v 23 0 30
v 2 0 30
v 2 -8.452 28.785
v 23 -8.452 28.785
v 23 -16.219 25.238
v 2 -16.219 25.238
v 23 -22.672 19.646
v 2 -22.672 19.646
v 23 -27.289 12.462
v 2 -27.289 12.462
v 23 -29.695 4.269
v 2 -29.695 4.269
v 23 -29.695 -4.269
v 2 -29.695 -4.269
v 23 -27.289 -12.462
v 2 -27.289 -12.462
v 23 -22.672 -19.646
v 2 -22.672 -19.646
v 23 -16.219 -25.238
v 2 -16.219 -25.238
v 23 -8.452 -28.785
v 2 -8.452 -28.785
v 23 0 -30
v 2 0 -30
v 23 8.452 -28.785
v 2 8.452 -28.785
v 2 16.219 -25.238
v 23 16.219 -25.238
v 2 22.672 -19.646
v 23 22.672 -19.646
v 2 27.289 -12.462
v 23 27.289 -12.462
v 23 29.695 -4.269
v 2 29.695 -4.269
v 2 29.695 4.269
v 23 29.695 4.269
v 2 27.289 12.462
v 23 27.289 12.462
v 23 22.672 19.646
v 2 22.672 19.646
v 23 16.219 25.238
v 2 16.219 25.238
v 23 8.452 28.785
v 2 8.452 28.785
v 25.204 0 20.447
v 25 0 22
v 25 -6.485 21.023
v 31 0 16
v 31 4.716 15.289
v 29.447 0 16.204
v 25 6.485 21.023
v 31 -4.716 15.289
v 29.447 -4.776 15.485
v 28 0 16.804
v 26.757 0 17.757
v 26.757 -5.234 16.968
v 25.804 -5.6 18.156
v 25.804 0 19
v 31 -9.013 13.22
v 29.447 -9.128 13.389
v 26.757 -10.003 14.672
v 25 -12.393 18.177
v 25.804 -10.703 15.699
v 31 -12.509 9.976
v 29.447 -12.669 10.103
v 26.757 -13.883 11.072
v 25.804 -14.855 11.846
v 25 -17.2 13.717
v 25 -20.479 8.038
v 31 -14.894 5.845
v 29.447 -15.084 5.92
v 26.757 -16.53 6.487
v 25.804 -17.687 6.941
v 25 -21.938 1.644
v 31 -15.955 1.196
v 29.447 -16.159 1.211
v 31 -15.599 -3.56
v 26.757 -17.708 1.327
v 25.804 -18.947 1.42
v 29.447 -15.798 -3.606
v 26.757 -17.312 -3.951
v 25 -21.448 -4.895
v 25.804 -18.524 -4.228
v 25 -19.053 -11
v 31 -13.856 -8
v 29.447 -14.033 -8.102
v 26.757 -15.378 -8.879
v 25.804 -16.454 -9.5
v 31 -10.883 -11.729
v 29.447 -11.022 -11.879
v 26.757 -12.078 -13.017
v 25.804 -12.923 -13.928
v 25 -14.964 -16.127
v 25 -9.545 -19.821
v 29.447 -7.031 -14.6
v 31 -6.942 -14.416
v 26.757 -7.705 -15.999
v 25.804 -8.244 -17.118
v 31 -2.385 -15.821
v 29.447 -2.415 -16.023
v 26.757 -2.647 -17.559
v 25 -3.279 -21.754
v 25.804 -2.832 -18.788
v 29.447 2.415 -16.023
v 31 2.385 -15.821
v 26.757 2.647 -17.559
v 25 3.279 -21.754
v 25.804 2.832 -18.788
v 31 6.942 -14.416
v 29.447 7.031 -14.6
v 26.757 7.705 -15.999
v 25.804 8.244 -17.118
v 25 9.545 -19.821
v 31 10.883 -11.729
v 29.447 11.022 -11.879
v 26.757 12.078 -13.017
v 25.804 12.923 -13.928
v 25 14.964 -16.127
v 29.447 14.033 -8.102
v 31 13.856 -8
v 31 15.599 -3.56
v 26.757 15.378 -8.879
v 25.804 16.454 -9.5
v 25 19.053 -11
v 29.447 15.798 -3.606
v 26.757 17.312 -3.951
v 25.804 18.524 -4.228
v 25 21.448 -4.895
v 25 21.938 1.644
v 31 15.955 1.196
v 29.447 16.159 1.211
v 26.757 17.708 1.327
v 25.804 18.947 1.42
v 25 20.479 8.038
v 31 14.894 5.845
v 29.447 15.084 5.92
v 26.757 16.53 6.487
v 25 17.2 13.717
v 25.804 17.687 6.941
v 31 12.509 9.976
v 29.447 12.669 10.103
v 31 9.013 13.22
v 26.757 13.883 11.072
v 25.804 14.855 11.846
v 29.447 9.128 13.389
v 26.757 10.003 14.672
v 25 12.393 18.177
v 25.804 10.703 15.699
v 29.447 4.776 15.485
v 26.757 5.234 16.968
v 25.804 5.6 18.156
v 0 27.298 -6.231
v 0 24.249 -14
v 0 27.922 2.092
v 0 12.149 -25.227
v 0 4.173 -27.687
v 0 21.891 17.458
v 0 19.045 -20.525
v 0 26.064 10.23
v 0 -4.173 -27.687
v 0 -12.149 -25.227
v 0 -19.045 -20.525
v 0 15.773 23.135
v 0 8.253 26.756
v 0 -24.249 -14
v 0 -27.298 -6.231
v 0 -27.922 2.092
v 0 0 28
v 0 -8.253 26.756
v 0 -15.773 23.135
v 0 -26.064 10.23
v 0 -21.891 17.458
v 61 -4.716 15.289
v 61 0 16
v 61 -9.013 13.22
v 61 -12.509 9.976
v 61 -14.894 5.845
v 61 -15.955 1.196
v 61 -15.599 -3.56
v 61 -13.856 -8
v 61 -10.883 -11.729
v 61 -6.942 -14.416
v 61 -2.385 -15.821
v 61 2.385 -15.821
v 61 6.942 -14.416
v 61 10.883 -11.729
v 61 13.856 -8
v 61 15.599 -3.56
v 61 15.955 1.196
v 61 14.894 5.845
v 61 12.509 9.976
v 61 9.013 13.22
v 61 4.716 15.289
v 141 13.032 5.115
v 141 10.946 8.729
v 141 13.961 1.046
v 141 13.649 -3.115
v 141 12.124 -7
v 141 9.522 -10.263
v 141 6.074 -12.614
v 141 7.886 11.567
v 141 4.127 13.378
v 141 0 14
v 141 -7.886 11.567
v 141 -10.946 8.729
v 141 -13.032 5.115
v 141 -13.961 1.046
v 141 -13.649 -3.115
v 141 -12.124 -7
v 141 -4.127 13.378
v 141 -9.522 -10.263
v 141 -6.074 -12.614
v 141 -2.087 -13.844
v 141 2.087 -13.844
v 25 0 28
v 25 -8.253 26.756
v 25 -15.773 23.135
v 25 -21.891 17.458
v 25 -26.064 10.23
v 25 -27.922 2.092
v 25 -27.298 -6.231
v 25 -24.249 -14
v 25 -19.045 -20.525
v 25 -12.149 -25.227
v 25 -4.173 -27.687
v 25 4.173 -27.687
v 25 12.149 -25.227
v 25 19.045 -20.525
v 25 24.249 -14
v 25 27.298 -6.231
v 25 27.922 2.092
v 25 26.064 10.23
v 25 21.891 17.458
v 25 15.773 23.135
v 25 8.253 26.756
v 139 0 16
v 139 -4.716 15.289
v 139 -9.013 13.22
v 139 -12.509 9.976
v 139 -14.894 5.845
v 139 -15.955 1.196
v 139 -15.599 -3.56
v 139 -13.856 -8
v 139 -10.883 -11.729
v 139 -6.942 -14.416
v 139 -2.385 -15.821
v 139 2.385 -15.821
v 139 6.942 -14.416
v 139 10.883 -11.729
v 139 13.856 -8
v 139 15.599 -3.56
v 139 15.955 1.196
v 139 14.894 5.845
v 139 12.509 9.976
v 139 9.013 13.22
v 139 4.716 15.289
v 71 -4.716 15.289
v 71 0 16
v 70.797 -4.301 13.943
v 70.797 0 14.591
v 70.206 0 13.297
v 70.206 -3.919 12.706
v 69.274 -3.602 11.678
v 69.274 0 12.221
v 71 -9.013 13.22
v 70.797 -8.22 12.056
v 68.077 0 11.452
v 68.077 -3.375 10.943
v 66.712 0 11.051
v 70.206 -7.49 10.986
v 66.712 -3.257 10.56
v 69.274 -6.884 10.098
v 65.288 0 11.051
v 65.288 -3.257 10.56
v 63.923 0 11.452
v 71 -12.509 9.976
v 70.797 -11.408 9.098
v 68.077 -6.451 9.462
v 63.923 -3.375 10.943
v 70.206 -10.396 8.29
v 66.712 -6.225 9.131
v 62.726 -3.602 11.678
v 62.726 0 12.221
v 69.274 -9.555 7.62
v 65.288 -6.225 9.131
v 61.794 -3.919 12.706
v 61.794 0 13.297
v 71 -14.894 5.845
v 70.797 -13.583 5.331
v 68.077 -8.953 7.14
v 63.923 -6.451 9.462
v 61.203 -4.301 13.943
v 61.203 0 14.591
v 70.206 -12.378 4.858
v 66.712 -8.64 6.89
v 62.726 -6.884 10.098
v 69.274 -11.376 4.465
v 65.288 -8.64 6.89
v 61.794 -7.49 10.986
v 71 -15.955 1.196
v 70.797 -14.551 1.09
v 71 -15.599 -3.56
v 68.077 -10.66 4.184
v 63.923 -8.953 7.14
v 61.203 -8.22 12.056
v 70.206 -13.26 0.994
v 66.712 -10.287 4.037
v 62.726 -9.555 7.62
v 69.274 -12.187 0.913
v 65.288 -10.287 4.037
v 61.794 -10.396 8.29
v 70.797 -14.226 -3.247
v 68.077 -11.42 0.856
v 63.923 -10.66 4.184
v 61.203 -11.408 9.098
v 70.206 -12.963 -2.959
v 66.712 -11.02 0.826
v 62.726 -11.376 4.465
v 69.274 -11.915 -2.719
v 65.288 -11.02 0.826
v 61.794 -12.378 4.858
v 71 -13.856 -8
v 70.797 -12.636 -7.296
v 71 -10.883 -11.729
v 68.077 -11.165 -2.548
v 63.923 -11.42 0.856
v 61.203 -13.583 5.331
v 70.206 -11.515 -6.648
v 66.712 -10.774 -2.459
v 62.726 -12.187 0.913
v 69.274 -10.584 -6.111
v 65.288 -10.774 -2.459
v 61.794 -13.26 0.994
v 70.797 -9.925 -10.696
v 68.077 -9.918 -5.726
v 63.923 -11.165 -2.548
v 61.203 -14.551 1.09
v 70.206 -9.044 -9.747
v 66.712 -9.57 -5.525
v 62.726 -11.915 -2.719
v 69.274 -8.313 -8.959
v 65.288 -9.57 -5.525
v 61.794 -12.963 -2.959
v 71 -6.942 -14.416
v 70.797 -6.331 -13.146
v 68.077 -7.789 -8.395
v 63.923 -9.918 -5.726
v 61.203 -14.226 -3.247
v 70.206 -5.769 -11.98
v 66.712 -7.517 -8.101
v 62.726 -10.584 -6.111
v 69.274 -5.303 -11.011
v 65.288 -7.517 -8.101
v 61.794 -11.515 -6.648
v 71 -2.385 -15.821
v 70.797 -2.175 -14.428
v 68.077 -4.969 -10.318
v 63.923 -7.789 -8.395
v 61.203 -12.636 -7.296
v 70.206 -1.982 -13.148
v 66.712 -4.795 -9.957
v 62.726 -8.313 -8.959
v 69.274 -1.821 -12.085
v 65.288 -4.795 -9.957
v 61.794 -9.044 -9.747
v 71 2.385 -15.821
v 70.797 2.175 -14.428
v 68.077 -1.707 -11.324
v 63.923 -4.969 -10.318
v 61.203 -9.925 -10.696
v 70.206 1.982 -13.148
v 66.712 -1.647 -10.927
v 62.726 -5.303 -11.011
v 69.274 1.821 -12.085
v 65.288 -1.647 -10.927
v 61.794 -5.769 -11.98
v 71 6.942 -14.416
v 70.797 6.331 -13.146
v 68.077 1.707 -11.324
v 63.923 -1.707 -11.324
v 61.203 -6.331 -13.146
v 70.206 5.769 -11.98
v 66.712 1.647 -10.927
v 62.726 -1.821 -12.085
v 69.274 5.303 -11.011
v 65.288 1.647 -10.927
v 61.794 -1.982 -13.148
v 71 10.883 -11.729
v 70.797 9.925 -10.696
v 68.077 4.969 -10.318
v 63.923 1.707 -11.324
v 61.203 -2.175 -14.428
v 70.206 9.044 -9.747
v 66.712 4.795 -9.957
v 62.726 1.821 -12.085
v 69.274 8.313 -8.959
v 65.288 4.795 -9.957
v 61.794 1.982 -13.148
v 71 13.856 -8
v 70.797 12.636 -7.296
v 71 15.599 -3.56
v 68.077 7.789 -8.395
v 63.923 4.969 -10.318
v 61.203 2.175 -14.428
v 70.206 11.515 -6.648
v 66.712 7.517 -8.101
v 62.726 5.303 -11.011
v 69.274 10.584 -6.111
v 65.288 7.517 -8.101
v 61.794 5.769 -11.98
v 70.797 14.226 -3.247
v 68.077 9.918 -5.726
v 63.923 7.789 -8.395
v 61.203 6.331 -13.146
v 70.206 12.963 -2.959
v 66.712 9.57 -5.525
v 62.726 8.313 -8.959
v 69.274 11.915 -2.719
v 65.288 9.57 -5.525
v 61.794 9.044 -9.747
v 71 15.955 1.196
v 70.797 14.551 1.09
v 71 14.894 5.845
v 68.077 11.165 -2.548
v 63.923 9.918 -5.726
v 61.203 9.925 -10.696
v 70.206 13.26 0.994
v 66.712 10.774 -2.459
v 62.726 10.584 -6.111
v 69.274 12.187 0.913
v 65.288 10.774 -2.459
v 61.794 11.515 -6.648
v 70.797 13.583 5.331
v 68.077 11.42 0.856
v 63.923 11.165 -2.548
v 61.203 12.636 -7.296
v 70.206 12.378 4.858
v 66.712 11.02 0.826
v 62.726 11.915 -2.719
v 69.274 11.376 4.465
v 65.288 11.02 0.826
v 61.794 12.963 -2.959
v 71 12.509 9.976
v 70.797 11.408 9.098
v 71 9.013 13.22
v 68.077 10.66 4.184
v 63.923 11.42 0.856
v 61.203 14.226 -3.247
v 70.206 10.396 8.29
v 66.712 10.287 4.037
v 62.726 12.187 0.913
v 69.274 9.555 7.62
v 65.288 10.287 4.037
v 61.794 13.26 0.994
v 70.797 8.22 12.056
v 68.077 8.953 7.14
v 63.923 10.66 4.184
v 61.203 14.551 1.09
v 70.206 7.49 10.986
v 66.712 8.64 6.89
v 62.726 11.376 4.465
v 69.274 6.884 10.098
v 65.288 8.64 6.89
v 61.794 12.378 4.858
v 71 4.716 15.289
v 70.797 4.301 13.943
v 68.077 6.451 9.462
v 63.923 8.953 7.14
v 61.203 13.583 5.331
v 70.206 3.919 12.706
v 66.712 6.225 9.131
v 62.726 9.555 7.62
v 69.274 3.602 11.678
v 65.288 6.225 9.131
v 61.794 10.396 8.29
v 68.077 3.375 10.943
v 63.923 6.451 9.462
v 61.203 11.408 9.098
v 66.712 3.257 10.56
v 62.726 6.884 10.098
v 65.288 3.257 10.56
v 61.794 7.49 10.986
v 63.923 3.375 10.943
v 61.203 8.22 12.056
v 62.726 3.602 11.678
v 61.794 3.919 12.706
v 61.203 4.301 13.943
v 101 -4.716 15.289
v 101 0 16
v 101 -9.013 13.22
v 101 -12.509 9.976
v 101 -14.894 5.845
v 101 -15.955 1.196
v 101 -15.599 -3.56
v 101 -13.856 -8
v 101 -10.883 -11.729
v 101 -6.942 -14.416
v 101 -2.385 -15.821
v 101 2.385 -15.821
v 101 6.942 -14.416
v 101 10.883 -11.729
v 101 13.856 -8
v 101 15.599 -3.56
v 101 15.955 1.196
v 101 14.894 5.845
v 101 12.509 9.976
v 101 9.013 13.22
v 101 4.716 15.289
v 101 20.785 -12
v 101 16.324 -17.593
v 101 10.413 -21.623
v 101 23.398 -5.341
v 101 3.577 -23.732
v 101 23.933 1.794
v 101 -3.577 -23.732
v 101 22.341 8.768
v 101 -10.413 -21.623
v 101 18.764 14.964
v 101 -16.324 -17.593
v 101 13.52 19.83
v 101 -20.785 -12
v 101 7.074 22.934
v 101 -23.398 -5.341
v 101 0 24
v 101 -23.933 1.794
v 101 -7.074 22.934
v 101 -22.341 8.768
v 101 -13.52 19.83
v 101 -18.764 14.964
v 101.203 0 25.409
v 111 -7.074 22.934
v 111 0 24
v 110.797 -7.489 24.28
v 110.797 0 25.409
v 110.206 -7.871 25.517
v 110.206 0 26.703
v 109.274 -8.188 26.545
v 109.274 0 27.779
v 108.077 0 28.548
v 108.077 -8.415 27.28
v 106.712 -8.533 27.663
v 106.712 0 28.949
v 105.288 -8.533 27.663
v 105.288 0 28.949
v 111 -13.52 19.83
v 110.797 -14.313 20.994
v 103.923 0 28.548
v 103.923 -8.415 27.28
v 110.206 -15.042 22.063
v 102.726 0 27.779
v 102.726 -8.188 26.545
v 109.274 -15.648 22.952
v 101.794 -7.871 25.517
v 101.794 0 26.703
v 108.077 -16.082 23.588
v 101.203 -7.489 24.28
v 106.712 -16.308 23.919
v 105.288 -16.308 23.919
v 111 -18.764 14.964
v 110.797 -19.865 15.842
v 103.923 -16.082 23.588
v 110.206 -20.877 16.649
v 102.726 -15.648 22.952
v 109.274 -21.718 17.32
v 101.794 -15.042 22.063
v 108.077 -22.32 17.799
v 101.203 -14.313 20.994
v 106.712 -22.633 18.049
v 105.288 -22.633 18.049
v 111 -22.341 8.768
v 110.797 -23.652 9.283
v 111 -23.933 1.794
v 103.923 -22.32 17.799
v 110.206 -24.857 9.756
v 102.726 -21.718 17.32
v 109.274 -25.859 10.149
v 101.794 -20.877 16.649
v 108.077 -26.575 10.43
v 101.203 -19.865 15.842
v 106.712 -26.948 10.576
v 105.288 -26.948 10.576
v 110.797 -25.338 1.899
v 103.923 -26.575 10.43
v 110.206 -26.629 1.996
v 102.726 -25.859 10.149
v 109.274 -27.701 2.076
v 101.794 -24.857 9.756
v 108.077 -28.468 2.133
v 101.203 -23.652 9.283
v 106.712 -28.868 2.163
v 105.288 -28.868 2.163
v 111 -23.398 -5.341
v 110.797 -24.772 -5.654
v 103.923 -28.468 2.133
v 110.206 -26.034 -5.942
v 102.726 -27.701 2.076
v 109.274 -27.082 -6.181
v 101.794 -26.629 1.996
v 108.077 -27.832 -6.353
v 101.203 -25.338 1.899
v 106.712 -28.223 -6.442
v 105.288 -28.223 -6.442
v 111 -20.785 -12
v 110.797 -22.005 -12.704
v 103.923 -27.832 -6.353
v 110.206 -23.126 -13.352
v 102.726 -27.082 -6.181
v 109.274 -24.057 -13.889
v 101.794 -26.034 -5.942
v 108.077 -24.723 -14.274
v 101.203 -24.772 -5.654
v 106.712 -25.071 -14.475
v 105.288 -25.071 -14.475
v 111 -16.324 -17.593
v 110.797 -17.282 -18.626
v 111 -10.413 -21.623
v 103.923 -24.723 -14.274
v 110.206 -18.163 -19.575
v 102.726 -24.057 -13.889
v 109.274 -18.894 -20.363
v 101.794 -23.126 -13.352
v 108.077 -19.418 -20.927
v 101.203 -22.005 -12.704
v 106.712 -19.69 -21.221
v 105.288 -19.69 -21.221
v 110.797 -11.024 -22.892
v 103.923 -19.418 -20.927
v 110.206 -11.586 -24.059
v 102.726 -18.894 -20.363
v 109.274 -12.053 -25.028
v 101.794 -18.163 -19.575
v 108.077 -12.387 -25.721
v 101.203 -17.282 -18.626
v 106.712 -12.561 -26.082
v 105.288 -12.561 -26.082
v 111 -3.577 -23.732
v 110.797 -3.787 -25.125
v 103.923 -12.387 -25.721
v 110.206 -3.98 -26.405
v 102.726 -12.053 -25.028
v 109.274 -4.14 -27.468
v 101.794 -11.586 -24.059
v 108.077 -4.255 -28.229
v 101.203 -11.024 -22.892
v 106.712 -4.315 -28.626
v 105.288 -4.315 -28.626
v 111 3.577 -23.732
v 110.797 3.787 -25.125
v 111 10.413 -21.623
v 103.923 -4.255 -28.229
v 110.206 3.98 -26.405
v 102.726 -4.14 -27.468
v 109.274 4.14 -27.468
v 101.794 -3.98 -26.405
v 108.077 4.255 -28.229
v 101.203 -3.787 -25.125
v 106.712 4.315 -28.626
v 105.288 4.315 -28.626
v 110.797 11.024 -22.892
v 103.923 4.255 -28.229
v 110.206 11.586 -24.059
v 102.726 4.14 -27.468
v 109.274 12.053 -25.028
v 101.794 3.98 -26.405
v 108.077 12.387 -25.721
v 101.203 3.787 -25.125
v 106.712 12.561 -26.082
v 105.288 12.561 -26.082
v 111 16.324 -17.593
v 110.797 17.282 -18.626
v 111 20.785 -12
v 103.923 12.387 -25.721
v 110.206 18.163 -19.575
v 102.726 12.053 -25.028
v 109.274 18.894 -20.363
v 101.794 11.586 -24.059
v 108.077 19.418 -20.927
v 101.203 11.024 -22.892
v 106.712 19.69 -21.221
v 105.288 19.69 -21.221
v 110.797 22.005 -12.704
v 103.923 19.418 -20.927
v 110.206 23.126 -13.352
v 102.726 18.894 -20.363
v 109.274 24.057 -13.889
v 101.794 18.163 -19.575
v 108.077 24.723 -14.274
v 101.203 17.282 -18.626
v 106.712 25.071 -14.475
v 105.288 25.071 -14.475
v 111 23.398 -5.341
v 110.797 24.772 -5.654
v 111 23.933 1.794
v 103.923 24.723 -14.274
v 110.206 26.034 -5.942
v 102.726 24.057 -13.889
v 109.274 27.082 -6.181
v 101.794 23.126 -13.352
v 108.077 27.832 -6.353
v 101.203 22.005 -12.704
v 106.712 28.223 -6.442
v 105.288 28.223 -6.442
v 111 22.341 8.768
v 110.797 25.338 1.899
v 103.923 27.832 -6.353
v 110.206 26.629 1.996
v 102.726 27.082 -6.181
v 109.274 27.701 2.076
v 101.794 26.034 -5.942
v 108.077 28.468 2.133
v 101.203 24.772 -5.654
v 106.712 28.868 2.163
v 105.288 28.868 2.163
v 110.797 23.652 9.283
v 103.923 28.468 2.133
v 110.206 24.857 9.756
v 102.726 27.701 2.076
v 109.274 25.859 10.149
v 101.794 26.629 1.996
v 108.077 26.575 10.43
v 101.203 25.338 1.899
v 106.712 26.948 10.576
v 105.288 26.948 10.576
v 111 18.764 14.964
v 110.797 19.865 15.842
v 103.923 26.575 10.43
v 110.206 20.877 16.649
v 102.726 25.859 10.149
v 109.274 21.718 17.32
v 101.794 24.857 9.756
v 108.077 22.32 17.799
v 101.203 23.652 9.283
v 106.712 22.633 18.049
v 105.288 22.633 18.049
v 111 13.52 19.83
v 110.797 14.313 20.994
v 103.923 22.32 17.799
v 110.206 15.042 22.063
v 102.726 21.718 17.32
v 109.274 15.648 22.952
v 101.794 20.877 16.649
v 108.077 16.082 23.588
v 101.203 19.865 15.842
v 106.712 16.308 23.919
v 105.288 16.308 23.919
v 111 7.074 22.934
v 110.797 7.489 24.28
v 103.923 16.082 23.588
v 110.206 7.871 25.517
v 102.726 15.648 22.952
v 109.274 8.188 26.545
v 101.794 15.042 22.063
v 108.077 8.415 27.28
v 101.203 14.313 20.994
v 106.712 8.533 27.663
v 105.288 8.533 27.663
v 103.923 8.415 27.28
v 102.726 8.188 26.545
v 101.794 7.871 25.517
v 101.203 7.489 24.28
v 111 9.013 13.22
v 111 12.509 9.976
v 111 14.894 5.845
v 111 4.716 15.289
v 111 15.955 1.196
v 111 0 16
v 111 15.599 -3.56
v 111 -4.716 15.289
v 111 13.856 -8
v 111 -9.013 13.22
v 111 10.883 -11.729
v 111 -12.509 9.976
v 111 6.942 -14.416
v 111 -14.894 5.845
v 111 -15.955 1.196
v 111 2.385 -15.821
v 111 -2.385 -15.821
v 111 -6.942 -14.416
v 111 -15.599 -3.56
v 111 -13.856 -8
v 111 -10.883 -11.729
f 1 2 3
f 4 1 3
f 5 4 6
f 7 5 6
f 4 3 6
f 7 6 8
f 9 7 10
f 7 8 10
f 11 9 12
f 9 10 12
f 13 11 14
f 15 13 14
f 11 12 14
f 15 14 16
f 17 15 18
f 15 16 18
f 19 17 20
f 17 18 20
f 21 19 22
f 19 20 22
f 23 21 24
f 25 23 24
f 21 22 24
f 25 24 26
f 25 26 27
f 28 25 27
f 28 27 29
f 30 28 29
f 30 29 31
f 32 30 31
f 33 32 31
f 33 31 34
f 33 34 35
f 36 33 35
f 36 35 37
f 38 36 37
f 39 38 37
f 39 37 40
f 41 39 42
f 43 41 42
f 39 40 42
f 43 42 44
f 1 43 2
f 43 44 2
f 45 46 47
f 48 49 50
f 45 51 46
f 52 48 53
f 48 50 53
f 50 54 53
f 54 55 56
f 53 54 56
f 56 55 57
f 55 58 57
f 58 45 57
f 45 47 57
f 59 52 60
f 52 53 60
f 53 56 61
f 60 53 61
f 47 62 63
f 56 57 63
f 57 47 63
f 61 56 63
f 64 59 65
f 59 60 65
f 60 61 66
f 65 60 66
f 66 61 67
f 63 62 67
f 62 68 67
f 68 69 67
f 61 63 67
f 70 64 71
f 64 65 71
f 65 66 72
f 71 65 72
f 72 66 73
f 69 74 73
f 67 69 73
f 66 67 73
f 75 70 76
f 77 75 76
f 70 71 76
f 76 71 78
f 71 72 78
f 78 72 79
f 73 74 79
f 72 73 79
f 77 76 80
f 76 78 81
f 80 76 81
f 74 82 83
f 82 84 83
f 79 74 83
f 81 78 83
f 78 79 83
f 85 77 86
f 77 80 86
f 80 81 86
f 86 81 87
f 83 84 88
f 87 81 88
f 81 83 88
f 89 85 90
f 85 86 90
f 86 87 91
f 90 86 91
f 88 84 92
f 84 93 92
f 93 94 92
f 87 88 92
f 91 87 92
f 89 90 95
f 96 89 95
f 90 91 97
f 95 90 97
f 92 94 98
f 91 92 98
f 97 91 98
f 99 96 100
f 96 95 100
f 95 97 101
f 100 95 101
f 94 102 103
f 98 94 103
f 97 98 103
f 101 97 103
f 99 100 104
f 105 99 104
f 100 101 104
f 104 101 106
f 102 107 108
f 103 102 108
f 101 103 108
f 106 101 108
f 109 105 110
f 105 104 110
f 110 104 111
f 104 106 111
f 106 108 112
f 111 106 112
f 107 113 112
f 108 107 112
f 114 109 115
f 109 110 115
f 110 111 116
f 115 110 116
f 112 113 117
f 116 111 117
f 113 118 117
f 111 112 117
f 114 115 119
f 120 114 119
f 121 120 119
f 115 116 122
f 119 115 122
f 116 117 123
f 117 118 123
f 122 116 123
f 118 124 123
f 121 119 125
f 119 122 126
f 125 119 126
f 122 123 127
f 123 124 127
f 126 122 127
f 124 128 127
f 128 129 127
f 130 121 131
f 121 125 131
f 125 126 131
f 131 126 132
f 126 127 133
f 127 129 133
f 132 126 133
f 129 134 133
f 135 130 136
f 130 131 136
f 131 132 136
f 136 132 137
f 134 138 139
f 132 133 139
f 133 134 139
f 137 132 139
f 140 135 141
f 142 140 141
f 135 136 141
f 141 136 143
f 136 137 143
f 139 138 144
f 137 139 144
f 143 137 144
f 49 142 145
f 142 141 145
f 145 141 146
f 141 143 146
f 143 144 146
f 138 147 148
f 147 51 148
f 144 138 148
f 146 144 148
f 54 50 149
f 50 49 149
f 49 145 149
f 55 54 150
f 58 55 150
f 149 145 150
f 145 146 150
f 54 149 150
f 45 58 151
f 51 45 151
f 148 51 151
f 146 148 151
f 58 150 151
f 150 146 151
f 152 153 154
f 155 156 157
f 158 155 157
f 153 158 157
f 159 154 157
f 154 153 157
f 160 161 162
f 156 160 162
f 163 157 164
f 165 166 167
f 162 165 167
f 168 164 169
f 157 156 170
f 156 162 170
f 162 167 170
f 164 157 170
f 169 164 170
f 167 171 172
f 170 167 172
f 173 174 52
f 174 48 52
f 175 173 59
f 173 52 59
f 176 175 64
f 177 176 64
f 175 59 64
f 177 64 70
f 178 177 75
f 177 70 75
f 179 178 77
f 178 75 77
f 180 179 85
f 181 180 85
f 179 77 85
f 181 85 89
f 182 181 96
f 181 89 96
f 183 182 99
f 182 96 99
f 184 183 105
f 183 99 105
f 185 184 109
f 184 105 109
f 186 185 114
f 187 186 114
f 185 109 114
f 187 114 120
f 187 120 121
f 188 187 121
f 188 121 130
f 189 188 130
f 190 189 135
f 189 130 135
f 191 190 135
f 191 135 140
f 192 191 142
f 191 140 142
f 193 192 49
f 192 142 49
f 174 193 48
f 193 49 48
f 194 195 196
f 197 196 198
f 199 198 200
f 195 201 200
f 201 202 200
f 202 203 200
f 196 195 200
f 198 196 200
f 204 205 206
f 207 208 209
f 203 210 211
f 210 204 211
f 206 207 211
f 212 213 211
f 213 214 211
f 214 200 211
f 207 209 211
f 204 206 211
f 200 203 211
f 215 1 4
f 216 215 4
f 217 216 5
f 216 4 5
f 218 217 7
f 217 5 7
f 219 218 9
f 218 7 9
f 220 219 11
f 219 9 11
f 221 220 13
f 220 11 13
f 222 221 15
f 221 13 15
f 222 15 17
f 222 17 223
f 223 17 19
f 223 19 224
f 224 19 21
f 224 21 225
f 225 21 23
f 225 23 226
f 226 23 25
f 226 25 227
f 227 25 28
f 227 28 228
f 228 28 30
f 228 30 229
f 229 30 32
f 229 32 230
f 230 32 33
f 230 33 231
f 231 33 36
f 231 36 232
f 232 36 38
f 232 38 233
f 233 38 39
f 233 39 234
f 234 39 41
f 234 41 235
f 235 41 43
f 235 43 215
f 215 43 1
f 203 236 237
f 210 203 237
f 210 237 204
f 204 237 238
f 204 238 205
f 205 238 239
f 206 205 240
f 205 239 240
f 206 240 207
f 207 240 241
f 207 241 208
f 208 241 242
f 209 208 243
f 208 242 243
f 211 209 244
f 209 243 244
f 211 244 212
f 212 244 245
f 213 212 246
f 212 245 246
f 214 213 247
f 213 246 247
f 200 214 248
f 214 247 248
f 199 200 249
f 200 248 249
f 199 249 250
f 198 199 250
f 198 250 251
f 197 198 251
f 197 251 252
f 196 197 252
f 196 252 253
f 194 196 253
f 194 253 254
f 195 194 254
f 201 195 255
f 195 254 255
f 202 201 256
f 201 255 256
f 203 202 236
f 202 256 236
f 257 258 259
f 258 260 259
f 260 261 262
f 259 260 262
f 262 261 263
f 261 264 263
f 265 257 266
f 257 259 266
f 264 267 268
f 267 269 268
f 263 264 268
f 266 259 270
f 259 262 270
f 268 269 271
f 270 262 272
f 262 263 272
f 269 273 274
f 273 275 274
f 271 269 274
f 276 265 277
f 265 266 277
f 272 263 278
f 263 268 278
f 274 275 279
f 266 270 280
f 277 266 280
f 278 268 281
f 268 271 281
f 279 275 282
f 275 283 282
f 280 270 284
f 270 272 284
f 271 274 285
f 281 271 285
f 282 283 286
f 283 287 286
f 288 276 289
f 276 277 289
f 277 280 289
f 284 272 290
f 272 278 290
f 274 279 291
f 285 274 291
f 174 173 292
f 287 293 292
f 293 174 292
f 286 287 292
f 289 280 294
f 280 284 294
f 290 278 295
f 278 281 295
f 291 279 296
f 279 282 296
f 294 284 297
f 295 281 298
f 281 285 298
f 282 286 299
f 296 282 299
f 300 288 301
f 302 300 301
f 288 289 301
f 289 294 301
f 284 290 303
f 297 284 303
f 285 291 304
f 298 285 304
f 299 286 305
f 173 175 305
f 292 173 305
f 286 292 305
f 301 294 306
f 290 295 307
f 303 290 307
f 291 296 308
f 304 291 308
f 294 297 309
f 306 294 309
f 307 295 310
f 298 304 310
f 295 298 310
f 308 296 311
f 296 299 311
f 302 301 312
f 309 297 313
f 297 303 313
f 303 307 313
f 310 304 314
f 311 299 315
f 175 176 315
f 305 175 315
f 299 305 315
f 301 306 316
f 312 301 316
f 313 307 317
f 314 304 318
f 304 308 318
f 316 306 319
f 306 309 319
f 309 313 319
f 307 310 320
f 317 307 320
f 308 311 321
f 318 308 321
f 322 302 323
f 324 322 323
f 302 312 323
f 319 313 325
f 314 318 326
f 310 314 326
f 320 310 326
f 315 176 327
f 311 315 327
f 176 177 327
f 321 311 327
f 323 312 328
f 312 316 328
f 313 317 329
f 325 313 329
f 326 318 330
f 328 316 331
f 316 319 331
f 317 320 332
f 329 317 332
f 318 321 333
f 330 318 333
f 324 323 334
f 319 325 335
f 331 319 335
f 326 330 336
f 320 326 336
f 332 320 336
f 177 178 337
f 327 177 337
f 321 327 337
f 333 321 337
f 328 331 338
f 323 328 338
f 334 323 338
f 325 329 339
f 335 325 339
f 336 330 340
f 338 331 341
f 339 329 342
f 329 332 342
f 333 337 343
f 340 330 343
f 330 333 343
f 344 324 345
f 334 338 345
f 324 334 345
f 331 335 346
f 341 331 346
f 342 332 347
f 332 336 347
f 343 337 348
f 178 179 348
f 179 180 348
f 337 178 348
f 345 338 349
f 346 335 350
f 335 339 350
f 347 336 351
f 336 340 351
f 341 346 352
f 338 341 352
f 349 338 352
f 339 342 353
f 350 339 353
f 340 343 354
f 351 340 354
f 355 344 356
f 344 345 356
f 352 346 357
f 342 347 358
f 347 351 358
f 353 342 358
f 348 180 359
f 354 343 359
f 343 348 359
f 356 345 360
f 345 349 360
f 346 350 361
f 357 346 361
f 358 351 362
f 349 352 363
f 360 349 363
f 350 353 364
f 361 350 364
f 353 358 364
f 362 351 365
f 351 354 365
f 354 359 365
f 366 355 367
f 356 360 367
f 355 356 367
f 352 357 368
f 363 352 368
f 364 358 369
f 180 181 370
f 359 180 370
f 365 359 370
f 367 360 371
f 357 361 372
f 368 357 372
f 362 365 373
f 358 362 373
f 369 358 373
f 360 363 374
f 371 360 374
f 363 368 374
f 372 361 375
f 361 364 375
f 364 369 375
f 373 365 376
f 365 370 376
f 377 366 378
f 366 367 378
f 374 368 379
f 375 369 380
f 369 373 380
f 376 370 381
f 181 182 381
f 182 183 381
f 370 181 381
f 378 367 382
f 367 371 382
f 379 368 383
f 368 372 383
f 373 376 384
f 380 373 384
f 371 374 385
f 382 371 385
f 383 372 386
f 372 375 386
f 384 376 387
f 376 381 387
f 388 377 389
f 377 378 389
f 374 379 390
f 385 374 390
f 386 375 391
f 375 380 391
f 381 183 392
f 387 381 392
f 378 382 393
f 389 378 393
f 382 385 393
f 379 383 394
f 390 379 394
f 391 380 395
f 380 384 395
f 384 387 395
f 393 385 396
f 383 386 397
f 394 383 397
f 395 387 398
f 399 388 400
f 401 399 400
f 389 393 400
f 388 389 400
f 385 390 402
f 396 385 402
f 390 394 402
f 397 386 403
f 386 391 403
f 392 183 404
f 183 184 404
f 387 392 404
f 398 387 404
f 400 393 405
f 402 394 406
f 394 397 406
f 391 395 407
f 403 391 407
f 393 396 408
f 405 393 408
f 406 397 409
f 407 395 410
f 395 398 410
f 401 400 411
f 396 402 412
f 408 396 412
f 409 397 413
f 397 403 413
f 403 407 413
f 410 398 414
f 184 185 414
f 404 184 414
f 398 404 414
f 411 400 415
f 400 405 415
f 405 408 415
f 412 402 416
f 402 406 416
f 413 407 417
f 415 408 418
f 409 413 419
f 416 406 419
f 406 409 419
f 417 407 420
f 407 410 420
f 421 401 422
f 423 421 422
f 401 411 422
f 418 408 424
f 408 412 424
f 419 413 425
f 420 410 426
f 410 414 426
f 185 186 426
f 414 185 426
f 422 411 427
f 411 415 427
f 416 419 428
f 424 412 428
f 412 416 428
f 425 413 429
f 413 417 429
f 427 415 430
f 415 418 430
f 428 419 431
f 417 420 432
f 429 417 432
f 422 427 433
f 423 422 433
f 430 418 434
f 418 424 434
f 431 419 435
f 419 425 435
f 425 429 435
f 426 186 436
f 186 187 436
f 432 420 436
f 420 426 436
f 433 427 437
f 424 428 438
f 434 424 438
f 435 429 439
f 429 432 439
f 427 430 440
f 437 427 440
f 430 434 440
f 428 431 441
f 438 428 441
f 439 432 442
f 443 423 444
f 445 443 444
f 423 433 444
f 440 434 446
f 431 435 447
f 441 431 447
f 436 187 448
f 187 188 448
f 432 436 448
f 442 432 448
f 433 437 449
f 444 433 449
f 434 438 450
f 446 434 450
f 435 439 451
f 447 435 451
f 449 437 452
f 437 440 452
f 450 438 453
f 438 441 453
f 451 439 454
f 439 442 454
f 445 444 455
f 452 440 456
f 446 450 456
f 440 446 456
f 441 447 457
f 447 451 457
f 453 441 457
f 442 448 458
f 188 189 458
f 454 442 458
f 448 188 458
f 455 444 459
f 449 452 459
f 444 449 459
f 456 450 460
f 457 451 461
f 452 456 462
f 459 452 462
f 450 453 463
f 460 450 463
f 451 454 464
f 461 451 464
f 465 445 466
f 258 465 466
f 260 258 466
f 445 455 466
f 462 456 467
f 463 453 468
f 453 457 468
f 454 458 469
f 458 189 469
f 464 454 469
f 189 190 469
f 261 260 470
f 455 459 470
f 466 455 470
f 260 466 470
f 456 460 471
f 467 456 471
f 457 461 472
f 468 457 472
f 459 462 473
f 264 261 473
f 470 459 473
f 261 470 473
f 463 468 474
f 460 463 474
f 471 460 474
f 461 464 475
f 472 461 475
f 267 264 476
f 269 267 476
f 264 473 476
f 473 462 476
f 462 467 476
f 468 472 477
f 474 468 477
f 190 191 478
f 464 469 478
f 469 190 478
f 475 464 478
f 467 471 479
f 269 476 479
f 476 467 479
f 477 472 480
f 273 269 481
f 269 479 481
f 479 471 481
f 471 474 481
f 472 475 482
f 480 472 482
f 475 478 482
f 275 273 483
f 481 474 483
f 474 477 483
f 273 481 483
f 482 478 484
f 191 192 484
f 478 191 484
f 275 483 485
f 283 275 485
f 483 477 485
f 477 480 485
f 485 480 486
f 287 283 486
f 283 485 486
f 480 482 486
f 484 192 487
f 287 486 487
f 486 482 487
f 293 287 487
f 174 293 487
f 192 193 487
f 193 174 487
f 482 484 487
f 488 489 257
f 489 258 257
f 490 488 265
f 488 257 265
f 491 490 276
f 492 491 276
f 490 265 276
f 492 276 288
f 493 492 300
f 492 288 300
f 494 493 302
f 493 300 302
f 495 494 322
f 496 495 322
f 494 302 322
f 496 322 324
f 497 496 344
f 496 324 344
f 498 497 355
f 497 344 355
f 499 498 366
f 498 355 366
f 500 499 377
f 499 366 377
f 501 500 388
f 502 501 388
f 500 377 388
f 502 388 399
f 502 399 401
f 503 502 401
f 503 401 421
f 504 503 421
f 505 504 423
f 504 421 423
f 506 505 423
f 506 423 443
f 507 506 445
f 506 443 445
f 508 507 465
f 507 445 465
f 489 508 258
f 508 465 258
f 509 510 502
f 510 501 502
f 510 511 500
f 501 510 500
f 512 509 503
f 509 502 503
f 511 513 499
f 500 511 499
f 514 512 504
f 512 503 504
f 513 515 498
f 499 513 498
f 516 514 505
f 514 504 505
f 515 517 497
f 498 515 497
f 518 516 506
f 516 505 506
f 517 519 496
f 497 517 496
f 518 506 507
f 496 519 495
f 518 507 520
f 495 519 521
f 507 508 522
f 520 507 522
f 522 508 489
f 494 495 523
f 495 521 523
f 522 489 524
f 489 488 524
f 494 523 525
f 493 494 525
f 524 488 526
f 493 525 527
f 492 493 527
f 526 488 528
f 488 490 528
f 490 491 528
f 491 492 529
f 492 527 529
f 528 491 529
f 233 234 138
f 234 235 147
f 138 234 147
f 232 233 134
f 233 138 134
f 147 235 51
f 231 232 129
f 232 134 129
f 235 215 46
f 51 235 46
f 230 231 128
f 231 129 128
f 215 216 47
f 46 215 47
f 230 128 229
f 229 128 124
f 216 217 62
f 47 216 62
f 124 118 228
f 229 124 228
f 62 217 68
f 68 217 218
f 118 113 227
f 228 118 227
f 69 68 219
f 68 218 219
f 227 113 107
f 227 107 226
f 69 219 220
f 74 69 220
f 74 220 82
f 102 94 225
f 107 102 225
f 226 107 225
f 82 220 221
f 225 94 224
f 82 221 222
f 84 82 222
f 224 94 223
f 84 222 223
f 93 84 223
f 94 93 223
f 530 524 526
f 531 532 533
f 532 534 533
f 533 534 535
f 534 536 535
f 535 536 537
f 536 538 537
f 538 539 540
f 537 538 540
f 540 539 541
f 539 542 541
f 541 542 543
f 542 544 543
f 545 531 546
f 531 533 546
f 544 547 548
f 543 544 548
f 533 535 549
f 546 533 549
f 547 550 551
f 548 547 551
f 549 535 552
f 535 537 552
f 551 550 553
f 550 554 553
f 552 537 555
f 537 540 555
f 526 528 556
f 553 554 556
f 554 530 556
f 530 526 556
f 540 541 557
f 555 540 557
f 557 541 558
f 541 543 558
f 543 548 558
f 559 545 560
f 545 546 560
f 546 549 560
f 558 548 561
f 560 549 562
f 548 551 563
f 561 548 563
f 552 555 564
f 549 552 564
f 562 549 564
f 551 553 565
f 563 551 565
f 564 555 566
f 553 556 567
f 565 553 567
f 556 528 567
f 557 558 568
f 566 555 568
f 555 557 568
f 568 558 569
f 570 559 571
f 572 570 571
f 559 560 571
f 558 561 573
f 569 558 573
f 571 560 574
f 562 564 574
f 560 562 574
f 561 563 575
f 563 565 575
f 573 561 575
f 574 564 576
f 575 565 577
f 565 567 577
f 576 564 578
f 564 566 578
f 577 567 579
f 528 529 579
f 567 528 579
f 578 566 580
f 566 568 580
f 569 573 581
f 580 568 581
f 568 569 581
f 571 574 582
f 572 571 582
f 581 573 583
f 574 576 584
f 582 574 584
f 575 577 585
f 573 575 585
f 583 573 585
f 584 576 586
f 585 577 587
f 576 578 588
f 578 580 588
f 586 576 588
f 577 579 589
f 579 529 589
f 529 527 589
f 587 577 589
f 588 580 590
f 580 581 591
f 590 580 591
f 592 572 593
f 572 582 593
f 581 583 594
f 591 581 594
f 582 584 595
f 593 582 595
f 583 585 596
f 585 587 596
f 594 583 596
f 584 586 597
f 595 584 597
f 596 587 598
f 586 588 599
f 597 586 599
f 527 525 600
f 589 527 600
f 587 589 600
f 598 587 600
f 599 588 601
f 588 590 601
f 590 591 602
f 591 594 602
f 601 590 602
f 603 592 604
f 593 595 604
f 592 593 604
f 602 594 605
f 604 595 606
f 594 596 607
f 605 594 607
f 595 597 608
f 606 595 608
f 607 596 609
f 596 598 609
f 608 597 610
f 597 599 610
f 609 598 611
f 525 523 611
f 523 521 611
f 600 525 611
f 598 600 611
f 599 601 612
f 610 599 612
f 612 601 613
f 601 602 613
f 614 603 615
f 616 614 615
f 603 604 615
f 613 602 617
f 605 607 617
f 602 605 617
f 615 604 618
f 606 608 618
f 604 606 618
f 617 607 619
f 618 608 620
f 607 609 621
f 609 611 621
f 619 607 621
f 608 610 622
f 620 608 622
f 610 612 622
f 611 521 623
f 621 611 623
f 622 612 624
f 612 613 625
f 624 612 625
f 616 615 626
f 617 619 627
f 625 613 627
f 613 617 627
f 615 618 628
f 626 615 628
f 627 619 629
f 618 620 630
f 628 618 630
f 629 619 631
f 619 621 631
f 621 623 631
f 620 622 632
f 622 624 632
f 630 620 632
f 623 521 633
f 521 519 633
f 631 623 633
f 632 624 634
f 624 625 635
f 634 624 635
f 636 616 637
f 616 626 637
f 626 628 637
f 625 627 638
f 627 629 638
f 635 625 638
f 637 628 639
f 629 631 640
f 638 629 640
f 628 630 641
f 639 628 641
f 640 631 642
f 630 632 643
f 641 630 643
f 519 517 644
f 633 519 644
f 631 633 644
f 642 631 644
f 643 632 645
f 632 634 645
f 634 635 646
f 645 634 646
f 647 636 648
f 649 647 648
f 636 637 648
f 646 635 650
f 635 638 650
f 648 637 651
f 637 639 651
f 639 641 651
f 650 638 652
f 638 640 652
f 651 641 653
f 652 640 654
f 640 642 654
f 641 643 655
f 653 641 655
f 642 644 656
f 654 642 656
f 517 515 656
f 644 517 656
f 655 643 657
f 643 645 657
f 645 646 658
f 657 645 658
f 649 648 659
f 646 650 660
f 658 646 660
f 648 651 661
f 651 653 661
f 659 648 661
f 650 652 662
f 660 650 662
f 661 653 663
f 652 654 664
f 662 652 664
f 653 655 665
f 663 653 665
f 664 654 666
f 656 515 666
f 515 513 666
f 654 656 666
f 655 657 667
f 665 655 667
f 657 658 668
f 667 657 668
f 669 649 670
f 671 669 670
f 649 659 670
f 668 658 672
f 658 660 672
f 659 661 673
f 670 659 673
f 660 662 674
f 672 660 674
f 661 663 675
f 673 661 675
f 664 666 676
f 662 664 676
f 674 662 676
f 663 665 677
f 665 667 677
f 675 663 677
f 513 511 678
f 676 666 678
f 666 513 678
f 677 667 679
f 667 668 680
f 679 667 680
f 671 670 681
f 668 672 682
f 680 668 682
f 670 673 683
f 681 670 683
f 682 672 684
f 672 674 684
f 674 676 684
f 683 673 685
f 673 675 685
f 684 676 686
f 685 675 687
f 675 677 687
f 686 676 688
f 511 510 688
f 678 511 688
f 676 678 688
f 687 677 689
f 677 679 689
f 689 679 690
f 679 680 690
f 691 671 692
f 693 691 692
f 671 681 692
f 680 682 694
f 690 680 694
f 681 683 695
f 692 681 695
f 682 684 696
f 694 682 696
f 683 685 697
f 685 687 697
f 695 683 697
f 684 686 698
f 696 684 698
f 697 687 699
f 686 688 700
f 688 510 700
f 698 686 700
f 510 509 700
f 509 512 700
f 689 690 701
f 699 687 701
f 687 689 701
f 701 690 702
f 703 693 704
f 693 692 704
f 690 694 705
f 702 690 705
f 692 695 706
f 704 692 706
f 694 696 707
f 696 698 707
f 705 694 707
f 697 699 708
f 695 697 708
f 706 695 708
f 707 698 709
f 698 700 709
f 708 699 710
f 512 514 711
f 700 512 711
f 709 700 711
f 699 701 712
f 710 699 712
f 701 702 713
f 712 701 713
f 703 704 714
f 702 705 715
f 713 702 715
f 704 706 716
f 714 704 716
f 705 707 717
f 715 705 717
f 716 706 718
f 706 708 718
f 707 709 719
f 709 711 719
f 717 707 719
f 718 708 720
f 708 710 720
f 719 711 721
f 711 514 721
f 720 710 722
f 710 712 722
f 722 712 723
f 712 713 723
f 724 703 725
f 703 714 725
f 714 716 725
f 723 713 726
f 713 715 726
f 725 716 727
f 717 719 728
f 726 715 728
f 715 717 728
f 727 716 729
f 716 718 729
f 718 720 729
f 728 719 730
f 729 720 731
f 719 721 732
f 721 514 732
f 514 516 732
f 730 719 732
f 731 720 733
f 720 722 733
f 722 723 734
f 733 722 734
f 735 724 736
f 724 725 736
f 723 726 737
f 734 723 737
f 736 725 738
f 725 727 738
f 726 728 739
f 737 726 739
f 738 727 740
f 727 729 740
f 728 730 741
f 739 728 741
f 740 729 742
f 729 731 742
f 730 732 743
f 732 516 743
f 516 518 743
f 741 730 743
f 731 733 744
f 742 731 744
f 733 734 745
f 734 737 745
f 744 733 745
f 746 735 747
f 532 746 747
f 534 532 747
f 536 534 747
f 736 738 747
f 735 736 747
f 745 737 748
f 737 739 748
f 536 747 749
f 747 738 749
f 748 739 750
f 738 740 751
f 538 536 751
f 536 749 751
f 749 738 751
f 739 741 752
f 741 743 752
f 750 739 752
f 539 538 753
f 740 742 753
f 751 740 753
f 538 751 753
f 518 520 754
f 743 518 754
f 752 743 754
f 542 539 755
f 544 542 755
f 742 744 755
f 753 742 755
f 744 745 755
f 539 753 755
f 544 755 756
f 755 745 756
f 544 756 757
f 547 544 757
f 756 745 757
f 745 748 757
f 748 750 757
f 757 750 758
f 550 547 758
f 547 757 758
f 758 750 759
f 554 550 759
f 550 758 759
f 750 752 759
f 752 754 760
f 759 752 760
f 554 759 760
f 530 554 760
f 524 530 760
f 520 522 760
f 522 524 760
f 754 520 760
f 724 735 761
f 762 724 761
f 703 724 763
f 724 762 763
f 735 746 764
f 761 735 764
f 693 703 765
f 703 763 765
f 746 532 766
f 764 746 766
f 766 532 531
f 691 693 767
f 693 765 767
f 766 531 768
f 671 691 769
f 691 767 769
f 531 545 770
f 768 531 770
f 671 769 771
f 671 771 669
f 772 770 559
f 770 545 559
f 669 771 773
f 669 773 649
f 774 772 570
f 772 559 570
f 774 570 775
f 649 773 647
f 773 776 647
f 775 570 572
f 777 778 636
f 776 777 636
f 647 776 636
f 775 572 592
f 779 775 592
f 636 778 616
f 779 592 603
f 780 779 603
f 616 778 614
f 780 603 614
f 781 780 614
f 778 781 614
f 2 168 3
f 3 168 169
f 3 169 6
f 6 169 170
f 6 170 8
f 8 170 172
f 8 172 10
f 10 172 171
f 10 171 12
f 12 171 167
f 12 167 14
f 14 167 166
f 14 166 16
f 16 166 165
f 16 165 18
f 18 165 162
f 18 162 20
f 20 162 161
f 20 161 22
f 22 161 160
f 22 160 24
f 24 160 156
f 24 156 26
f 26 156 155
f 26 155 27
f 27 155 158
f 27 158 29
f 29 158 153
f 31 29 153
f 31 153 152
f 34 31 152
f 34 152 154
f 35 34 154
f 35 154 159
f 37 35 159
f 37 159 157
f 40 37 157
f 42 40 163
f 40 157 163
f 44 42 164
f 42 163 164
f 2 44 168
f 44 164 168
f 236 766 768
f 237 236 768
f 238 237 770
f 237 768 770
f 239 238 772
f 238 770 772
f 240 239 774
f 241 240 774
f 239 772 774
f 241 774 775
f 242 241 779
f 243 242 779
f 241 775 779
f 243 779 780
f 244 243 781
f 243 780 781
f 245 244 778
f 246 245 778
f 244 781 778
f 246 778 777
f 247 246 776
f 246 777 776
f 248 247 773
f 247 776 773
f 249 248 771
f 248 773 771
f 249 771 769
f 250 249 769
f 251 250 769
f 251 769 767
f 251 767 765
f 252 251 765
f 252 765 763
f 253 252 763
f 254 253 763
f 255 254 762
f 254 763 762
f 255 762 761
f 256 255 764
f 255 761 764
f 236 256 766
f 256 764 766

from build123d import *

# Parameters (mm, degrees)
CHAMFER1_SIZE = 2


with BuildPart() as part:
    # Sketch1 → Revolve1 (revolve)
    with BuildSketch(Plane.XY, mode=Mode.PRIVATE) as revolve1_sk:
        with BuildLine():
            Line((0, 0), (141, 0))
            Line((141, 0), (141, 16))
            Line((141, 16), (111, 16))
            Line((111, 16), (111, 24))
            ThreePointArc((111, 24), (106, 29), (101, 24))
            Line((101, 24), (101, 16))
            Line((101, 16), (71, 16))
            ThreePointArc((71, 16), (66, 11), (61, 16))
            Line((61, 16), (31, 16))
            ThreePointArc((31, 16), (26.757359313, 17.757359313), (25, 22))
            Line((25, 22), (25, 30))
            Line((25, 30), (0, 30))
            Line((0, 30), (0, 0))
        make_face()
    revolve(revolve1_sk.sketch.rotate(Axis((-31.320754717, 0, 0), (1, 0, 0)), 90), axis=Axis((-31.320754717, 0, 0), (1, 0, 0)))

    # Chamfer1
    chamfer1_edges = [part.edges().sort_by_distance(p)[0] for p in [
        (141, 0, -16),
        (25, 0, -30),
        (0, 0, -30),
    ]]
    chamfer(chamfer1_edges, length=CHAMFER1_SIZE)


solid = part.part
